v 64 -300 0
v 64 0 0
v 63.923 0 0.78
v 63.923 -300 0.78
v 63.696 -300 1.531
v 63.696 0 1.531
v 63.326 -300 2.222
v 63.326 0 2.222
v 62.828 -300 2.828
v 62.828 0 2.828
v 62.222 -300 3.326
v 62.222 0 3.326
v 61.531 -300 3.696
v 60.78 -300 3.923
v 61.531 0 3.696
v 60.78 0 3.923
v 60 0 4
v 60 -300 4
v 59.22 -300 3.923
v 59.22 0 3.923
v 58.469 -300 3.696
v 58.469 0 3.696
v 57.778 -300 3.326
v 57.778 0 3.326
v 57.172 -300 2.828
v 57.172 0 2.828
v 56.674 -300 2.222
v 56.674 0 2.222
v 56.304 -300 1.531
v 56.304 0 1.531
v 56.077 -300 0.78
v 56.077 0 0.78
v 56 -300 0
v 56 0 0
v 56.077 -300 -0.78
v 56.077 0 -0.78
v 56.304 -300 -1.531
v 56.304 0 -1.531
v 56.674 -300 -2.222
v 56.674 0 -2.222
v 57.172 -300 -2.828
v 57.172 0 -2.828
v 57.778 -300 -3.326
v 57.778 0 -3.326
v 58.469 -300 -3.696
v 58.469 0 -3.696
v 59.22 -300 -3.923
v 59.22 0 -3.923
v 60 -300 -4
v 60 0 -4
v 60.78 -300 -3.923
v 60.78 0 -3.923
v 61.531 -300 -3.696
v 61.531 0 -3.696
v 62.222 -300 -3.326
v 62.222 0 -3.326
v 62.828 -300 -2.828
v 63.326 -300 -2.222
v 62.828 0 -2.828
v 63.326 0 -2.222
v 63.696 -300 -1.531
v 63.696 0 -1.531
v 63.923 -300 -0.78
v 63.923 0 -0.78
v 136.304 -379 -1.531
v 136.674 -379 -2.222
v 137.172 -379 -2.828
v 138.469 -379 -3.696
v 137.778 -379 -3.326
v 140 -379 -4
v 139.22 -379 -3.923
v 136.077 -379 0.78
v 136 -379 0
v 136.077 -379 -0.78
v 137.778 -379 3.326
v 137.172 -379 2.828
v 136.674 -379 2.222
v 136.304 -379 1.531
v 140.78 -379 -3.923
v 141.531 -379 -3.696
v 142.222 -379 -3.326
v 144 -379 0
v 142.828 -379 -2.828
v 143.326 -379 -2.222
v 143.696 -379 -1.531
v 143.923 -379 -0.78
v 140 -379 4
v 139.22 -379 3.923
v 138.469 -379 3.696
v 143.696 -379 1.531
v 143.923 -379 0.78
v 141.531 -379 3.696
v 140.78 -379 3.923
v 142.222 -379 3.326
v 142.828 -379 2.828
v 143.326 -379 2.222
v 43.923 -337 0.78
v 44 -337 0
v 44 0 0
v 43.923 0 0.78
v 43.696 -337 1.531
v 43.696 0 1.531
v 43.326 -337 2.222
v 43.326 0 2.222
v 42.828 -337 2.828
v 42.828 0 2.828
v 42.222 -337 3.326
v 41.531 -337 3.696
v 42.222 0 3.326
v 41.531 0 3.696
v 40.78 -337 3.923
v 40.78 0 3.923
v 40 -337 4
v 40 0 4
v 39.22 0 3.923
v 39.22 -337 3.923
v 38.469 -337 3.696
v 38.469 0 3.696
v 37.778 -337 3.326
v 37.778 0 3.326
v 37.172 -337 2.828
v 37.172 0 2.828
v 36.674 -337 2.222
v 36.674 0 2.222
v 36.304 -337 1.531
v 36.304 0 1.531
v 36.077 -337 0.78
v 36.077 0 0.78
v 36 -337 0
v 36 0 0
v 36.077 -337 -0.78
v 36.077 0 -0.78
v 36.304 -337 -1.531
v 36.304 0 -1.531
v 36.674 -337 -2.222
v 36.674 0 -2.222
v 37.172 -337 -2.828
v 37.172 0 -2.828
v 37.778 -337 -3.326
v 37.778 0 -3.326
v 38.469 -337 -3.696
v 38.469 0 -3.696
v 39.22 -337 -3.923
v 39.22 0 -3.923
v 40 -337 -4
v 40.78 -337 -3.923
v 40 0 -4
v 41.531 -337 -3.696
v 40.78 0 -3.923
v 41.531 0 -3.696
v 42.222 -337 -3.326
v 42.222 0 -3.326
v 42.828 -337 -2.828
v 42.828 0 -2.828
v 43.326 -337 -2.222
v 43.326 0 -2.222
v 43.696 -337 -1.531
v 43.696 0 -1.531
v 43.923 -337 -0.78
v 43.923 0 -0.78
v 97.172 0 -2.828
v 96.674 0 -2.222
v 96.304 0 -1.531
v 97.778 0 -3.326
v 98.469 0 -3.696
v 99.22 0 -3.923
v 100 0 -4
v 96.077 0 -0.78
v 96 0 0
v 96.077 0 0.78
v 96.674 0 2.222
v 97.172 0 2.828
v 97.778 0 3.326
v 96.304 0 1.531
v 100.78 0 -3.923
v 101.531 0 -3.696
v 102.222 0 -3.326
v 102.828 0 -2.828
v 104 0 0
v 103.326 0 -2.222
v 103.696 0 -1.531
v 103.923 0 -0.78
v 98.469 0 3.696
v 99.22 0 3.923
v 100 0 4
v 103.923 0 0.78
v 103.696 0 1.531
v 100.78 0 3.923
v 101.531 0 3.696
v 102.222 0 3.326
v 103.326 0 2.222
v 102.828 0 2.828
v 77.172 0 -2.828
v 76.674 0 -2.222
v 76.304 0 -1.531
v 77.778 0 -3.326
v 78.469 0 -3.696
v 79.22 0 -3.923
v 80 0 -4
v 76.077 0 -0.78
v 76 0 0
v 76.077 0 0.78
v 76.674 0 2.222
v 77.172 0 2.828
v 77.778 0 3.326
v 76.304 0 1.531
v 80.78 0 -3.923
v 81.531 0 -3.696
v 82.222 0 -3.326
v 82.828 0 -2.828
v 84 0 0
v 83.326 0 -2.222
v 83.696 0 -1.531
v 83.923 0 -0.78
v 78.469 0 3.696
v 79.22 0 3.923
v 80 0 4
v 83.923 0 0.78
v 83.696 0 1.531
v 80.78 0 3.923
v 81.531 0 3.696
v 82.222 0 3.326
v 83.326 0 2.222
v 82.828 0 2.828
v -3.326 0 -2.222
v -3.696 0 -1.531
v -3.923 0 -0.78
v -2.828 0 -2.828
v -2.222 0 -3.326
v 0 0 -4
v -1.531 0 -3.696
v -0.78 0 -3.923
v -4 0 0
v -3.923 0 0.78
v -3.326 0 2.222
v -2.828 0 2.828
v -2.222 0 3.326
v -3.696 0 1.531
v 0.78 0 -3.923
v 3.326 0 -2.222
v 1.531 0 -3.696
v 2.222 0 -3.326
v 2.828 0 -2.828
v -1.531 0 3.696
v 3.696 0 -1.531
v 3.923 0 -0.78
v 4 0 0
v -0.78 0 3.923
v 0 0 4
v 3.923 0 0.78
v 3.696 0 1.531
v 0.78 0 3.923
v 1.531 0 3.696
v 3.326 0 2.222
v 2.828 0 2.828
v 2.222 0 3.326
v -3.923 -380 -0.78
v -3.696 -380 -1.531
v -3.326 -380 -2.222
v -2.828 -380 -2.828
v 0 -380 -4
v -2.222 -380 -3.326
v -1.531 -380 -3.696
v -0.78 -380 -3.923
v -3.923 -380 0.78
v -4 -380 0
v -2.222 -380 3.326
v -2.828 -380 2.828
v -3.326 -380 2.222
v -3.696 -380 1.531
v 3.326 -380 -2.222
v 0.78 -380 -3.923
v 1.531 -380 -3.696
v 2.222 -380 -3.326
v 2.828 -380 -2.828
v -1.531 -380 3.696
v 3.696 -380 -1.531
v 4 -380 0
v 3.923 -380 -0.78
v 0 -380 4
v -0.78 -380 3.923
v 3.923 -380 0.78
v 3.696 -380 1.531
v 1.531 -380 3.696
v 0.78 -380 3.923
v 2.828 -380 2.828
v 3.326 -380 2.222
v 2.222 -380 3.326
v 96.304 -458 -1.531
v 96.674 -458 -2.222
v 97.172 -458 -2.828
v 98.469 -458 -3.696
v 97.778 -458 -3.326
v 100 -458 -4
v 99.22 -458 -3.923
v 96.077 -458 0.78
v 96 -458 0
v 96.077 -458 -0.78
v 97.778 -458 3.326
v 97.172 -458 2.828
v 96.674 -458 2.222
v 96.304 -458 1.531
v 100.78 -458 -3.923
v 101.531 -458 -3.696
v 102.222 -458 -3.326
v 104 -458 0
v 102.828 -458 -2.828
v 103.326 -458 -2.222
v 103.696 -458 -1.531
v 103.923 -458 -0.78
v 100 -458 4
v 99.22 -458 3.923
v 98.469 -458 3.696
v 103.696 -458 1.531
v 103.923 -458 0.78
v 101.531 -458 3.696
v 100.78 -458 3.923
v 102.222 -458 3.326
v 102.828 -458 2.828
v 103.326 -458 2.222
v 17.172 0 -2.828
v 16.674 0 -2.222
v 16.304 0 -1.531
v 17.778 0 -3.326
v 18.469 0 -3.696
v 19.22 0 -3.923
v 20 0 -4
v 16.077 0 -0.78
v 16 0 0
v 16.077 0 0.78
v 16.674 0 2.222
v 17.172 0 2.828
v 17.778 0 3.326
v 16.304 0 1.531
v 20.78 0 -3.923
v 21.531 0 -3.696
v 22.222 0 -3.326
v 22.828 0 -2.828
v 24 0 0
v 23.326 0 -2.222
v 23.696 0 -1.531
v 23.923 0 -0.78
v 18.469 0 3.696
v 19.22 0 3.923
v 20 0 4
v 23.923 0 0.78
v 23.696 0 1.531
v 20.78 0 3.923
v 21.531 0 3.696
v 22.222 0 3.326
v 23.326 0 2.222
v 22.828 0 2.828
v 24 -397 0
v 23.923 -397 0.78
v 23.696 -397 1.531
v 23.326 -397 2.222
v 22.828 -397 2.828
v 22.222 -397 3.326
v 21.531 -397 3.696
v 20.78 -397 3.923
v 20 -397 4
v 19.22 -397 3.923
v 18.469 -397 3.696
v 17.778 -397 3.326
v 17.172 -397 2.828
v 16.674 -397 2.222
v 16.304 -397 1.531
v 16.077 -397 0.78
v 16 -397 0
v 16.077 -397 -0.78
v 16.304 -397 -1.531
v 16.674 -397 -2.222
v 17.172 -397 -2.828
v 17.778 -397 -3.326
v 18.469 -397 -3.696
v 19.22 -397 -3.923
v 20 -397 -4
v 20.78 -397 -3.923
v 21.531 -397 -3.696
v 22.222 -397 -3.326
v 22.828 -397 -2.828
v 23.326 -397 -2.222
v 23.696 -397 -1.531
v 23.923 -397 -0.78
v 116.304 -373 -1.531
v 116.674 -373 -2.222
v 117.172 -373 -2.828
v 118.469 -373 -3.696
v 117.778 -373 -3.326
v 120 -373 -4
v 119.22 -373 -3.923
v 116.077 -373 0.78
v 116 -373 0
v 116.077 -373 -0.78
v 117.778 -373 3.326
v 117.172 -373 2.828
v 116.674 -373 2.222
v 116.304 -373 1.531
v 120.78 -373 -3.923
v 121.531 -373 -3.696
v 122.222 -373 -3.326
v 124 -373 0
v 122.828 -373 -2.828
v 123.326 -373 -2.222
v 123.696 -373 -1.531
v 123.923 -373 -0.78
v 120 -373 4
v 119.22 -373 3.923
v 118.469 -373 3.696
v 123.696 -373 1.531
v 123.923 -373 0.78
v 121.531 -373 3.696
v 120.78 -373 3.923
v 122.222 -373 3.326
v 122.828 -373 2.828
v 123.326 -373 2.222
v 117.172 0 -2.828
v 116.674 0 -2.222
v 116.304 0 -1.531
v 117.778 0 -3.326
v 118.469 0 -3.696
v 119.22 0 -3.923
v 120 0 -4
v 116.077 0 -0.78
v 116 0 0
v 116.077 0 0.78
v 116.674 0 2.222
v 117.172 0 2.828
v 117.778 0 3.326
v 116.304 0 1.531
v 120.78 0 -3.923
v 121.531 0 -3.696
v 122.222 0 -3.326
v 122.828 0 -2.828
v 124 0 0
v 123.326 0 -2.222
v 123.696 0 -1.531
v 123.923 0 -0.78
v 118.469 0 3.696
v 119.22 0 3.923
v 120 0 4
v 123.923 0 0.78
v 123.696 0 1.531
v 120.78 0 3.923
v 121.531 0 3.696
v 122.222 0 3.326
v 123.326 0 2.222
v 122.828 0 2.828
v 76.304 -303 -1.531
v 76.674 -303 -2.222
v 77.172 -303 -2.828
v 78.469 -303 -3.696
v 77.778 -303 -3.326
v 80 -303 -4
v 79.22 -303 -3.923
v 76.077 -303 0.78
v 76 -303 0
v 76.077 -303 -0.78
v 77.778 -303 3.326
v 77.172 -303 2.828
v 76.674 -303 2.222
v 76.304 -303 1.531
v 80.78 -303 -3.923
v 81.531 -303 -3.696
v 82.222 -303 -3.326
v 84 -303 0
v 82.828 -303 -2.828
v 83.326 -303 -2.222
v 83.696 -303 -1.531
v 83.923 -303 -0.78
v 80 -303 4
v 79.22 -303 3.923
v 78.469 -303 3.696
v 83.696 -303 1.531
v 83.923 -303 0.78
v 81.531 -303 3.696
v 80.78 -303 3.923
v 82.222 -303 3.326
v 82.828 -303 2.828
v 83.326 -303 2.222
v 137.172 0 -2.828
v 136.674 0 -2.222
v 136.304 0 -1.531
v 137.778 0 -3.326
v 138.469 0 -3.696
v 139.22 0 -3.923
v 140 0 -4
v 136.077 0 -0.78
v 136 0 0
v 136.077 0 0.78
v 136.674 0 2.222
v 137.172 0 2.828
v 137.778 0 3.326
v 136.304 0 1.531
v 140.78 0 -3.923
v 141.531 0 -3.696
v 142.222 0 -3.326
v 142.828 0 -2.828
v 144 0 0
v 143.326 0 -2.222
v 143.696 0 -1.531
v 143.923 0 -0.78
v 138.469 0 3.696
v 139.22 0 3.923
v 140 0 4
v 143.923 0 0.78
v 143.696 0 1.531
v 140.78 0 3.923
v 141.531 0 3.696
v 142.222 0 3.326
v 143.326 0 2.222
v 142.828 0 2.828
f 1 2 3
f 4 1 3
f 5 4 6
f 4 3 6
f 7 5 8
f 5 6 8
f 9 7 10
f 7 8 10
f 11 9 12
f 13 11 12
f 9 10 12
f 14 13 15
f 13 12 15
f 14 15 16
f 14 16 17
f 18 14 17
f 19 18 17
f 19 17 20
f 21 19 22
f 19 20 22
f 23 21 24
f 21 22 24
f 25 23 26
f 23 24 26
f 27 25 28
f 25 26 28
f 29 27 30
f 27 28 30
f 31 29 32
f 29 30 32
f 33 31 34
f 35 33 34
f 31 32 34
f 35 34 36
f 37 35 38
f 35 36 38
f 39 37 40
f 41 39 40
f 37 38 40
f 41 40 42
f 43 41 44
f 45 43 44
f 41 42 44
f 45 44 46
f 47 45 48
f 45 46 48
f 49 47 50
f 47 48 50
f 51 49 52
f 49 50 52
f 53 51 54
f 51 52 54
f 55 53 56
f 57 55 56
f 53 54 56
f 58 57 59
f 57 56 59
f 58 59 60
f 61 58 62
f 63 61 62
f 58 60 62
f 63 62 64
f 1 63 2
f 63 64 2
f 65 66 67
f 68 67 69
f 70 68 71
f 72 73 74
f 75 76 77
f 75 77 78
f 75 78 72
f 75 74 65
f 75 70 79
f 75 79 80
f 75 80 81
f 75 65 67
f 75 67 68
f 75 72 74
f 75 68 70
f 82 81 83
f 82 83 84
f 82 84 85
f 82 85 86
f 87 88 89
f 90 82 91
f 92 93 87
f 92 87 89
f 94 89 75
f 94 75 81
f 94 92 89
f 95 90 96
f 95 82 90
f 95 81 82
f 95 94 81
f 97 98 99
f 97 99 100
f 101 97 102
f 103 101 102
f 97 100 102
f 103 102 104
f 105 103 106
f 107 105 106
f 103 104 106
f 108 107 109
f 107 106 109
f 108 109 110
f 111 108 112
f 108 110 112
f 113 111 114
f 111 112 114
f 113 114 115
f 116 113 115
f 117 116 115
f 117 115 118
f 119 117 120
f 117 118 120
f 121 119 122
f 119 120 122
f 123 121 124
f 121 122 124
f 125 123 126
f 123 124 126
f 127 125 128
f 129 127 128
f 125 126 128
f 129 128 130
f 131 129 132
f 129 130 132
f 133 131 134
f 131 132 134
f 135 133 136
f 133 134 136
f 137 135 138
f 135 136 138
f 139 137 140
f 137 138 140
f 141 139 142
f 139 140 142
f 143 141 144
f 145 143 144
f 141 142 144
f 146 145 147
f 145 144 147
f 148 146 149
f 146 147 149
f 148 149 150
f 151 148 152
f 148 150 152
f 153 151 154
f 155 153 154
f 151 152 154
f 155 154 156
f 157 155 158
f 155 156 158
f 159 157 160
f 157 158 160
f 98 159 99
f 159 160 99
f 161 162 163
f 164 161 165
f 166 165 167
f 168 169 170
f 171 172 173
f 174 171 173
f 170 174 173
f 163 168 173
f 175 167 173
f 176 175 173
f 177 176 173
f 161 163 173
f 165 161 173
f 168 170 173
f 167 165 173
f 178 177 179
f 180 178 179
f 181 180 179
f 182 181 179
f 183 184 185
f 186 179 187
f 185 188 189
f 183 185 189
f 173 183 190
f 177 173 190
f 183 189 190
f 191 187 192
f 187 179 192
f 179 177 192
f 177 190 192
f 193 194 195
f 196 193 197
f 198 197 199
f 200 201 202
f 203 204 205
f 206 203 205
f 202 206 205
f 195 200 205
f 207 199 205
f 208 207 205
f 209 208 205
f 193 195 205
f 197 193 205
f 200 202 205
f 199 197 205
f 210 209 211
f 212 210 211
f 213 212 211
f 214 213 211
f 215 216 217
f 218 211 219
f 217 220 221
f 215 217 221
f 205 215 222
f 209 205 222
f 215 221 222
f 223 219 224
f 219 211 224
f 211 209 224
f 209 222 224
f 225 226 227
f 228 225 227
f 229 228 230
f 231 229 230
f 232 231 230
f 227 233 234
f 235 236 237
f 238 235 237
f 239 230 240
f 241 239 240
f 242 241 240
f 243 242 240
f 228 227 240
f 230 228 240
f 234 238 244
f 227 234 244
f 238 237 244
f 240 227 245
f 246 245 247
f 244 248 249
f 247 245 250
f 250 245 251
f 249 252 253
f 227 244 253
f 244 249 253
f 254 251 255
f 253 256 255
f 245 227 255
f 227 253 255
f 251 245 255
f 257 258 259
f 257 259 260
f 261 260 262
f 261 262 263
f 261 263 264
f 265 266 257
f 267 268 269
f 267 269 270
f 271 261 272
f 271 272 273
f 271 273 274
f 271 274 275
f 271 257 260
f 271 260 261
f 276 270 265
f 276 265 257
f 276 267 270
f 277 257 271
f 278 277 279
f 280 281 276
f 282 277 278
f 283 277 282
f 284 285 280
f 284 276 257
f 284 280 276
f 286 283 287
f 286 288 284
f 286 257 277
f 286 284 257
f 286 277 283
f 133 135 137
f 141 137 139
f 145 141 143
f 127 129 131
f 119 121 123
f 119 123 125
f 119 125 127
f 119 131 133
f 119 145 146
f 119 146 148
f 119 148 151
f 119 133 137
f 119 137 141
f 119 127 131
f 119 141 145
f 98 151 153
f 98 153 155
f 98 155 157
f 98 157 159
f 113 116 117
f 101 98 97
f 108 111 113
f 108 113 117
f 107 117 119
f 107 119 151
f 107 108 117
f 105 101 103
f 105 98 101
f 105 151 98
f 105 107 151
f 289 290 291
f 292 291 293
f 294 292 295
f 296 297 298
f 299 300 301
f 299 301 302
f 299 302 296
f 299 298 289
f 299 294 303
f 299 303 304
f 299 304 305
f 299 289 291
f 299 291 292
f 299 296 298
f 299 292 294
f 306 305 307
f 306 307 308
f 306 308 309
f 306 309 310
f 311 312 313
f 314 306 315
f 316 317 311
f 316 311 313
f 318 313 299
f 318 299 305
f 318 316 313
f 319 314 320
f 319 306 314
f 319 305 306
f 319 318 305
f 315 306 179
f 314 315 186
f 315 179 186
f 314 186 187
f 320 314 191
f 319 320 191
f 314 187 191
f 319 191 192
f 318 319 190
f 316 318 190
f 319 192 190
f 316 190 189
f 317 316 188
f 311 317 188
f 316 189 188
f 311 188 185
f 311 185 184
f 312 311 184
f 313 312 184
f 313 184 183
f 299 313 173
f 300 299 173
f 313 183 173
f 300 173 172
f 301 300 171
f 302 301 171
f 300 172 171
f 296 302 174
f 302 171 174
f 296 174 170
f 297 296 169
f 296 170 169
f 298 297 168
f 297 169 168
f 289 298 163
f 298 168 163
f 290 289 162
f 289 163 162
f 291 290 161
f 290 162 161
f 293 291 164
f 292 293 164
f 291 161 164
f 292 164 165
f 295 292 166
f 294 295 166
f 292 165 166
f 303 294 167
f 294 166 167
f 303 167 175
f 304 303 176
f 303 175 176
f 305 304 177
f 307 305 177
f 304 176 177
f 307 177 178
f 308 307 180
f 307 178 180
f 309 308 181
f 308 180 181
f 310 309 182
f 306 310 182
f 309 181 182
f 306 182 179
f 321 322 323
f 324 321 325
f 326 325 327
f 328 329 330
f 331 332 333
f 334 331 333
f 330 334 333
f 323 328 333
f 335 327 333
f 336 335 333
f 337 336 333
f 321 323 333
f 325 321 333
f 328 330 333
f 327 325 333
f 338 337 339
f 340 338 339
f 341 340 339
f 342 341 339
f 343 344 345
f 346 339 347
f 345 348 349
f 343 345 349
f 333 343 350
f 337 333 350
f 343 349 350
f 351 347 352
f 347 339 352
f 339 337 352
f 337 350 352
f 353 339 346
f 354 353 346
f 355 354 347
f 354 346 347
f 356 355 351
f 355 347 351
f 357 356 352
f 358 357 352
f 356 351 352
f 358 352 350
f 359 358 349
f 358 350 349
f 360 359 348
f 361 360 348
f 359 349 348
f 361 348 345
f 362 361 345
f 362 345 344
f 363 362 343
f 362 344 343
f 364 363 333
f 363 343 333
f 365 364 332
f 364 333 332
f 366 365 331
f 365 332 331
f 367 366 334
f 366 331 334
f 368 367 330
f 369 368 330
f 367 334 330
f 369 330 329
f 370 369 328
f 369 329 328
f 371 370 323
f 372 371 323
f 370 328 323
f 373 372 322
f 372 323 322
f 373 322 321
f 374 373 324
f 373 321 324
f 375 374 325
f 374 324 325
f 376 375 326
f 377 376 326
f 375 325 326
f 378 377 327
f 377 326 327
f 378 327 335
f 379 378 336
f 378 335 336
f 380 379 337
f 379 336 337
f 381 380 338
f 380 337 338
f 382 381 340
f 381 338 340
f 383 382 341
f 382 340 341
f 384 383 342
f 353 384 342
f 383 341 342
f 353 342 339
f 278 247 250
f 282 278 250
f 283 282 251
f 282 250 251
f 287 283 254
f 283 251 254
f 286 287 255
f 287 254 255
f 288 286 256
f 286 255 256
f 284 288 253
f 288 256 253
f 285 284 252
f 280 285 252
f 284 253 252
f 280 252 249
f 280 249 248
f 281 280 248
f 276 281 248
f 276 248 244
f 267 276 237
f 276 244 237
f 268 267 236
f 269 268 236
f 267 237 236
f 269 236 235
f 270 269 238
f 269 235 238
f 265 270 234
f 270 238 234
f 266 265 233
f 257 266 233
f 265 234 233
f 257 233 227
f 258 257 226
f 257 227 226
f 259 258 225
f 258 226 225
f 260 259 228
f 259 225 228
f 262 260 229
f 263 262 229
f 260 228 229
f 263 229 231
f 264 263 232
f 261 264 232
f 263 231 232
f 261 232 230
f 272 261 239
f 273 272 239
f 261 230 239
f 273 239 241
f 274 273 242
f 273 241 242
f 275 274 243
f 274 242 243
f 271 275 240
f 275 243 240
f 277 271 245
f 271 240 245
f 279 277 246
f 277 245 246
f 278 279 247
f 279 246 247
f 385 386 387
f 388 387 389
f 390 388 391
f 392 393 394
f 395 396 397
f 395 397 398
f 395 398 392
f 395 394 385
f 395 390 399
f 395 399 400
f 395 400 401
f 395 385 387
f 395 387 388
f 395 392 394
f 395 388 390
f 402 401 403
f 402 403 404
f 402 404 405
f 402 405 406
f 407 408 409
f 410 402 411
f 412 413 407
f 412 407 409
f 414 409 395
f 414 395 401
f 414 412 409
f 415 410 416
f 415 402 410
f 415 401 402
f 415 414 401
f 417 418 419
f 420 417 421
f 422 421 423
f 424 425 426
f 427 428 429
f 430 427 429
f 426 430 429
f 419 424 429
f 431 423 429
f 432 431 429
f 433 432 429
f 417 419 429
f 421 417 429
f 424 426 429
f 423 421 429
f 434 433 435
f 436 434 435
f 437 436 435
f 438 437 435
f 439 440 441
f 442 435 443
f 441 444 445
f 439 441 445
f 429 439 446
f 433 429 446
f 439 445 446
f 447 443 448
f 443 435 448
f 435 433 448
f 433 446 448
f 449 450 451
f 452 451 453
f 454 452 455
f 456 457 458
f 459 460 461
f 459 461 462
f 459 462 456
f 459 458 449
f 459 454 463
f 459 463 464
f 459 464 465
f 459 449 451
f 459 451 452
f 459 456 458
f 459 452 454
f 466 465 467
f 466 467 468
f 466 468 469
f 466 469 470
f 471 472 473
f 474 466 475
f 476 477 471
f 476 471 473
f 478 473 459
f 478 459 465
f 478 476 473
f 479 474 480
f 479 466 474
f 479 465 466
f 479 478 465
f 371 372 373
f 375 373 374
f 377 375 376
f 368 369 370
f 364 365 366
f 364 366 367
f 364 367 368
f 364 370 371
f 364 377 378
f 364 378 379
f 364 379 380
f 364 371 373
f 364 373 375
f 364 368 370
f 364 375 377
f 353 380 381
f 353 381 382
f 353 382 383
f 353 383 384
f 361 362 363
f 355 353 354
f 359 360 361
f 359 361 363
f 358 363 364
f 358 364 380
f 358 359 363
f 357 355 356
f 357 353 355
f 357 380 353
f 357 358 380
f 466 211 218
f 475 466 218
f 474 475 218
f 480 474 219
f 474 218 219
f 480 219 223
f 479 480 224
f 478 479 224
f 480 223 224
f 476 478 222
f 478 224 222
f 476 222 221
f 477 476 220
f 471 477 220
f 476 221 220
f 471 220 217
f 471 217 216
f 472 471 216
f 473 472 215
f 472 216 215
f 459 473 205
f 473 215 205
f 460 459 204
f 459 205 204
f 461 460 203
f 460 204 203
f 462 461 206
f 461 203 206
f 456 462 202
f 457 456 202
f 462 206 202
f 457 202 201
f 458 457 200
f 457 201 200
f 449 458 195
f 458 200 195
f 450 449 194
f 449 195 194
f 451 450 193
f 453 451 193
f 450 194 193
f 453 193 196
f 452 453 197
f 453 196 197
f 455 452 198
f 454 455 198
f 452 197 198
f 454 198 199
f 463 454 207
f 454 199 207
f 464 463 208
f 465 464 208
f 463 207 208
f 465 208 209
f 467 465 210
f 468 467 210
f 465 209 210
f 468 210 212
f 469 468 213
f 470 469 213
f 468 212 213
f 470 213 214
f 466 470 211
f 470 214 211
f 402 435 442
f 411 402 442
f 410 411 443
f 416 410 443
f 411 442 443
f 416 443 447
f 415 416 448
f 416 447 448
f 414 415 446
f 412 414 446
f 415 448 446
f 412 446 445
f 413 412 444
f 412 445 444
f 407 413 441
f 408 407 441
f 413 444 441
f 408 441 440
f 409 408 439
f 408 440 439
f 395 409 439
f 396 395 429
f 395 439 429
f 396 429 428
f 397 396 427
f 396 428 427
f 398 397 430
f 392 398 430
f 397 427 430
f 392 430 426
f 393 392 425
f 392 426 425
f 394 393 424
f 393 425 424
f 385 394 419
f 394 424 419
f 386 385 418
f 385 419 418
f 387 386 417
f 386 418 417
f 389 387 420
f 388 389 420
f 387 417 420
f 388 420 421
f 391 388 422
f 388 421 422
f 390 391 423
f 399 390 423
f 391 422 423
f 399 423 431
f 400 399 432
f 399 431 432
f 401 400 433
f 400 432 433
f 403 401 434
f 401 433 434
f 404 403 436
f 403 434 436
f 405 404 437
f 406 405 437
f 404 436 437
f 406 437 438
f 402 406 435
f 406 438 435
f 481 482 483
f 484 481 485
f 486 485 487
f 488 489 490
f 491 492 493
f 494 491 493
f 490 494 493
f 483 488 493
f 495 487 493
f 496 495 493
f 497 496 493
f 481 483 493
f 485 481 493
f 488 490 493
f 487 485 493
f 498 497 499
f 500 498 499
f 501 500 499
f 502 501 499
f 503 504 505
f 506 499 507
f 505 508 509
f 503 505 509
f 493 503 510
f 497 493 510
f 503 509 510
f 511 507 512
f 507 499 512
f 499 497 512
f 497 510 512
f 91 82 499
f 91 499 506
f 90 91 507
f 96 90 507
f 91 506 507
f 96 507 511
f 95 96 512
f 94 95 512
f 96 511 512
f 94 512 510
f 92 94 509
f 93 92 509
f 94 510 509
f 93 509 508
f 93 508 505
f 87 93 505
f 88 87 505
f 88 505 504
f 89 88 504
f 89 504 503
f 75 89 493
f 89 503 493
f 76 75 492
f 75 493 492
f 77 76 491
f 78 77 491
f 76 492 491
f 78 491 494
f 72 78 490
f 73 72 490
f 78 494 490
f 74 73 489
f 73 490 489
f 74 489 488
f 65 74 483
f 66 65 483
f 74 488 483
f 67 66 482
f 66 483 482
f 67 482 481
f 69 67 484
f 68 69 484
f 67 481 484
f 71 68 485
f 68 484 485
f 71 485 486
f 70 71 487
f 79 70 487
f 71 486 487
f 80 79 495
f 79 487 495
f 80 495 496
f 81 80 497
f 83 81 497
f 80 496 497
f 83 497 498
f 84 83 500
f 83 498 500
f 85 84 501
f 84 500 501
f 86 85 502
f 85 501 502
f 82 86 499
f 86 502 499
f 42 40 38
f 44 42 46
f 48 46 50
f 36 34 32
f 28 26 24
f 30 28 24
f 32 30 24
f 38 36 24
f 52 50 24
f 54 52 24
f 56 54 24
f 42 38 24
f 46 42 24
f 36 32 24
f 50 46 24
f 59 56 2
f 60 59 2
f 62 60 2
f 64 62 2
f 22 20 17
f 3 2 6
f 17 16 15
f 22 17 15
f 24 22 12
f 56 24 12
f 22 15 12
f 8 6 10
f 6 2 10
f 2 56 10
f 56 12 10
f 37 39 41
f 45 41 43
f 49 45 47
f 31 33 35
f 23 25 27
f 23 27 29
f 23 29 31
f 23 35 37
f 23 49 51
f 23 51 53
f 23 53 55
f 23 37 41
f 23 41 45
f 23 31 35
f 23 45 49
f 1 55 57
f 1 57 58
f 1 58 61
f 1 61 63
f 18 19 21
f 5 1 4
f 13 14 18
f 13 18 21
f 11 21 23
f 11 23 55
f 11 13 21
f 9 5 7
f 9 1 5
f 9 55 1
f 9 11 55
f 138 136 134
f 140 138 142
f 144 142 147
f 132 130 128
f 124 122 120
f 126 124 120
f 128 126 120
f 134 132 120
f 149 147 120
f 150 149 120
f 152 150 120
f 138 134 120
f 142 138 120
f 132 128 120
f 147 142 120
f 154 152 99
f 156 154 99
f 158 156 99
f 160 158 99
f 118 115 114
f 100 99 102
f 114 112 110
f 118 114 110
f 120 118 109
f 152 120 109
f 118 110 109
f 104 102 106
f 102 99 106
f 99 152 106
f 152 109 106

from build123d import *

# Parameters (mm, degrees)
F0_R     = 4
F1_DEPTH = 380
F2_DEPTH = 397
F3_DEPTH = 337
F4_DEPTH = 300
F5_DEPTH = 303
F6_DEPTH = 458
F7_DEPTH = 373
F8_DEPTH = 379


with BuildPart() as f1:
    # F0 (on Front) → F1 (new body)
    with BuildSketch(Plane.XZ):
        Circle(F0_R)
    extrude(amount=F1_DEPTH)


with BuildPart() as f2:
    # F0 (on Front) → F2 (new body)
    with BuildSketch(Plane.XZ):
        with Locations((20, 0)):
            Circle(F0_R)
    extrude(amount=F2_DEPTH)


with BuildPart() as f3:
    # F0 (on Front) → F3 (new body)
    with BuildSketch(Plane.XZ):
        with Locations((40, 0)):
            Circle(F0_R)
    extrude(amount=F3_DEPTH)


with BuildPart() as f4:
    # F0 (on Front) → F4 (new body)
    with BuildSketch(Plane.XZ):
        with Locations((60, 0)):
            Circle(F0_R)
    extrude(amount=F4_DEPTH)


with BuildPart() as f5:
    # F0 (on Front) → F5 (new body)
    with BuildSketch(Plane.XZ):
        with Locations((80, 0)):
            Circle(F0_R)
    extrude(amount=F5_DEPTH)


with BuildPart() as f6:
    # F0 (on Front) → F6 (new body)
    with BuildSketch(Plane.XZ):
        with Locations((100, 0)):
            Circle(F0_R)
    extrude(amount=F6_DEPTH)


with BuildPart() as f7:
    # F0 (on Front) → F7 (new body)
    with BuildSketch(Plane.XZ):
        with Locations((120, 0)):
            Circle(F0_R)
    extrude(amount=F7_DEPTH)


with BuildPart() as f8:
    # F0 (on Front) → F8 (new body)
    with BuildSketch(Plane.XZ):
        with Locations((140, 0)):
            Circle(F0_R)
    extrude(amount=F8_DEPTH)


solid = Compound([f1.part, f2.part, f3.part, f4.part, f5.part, f6.part, f7.part, f8.part])
